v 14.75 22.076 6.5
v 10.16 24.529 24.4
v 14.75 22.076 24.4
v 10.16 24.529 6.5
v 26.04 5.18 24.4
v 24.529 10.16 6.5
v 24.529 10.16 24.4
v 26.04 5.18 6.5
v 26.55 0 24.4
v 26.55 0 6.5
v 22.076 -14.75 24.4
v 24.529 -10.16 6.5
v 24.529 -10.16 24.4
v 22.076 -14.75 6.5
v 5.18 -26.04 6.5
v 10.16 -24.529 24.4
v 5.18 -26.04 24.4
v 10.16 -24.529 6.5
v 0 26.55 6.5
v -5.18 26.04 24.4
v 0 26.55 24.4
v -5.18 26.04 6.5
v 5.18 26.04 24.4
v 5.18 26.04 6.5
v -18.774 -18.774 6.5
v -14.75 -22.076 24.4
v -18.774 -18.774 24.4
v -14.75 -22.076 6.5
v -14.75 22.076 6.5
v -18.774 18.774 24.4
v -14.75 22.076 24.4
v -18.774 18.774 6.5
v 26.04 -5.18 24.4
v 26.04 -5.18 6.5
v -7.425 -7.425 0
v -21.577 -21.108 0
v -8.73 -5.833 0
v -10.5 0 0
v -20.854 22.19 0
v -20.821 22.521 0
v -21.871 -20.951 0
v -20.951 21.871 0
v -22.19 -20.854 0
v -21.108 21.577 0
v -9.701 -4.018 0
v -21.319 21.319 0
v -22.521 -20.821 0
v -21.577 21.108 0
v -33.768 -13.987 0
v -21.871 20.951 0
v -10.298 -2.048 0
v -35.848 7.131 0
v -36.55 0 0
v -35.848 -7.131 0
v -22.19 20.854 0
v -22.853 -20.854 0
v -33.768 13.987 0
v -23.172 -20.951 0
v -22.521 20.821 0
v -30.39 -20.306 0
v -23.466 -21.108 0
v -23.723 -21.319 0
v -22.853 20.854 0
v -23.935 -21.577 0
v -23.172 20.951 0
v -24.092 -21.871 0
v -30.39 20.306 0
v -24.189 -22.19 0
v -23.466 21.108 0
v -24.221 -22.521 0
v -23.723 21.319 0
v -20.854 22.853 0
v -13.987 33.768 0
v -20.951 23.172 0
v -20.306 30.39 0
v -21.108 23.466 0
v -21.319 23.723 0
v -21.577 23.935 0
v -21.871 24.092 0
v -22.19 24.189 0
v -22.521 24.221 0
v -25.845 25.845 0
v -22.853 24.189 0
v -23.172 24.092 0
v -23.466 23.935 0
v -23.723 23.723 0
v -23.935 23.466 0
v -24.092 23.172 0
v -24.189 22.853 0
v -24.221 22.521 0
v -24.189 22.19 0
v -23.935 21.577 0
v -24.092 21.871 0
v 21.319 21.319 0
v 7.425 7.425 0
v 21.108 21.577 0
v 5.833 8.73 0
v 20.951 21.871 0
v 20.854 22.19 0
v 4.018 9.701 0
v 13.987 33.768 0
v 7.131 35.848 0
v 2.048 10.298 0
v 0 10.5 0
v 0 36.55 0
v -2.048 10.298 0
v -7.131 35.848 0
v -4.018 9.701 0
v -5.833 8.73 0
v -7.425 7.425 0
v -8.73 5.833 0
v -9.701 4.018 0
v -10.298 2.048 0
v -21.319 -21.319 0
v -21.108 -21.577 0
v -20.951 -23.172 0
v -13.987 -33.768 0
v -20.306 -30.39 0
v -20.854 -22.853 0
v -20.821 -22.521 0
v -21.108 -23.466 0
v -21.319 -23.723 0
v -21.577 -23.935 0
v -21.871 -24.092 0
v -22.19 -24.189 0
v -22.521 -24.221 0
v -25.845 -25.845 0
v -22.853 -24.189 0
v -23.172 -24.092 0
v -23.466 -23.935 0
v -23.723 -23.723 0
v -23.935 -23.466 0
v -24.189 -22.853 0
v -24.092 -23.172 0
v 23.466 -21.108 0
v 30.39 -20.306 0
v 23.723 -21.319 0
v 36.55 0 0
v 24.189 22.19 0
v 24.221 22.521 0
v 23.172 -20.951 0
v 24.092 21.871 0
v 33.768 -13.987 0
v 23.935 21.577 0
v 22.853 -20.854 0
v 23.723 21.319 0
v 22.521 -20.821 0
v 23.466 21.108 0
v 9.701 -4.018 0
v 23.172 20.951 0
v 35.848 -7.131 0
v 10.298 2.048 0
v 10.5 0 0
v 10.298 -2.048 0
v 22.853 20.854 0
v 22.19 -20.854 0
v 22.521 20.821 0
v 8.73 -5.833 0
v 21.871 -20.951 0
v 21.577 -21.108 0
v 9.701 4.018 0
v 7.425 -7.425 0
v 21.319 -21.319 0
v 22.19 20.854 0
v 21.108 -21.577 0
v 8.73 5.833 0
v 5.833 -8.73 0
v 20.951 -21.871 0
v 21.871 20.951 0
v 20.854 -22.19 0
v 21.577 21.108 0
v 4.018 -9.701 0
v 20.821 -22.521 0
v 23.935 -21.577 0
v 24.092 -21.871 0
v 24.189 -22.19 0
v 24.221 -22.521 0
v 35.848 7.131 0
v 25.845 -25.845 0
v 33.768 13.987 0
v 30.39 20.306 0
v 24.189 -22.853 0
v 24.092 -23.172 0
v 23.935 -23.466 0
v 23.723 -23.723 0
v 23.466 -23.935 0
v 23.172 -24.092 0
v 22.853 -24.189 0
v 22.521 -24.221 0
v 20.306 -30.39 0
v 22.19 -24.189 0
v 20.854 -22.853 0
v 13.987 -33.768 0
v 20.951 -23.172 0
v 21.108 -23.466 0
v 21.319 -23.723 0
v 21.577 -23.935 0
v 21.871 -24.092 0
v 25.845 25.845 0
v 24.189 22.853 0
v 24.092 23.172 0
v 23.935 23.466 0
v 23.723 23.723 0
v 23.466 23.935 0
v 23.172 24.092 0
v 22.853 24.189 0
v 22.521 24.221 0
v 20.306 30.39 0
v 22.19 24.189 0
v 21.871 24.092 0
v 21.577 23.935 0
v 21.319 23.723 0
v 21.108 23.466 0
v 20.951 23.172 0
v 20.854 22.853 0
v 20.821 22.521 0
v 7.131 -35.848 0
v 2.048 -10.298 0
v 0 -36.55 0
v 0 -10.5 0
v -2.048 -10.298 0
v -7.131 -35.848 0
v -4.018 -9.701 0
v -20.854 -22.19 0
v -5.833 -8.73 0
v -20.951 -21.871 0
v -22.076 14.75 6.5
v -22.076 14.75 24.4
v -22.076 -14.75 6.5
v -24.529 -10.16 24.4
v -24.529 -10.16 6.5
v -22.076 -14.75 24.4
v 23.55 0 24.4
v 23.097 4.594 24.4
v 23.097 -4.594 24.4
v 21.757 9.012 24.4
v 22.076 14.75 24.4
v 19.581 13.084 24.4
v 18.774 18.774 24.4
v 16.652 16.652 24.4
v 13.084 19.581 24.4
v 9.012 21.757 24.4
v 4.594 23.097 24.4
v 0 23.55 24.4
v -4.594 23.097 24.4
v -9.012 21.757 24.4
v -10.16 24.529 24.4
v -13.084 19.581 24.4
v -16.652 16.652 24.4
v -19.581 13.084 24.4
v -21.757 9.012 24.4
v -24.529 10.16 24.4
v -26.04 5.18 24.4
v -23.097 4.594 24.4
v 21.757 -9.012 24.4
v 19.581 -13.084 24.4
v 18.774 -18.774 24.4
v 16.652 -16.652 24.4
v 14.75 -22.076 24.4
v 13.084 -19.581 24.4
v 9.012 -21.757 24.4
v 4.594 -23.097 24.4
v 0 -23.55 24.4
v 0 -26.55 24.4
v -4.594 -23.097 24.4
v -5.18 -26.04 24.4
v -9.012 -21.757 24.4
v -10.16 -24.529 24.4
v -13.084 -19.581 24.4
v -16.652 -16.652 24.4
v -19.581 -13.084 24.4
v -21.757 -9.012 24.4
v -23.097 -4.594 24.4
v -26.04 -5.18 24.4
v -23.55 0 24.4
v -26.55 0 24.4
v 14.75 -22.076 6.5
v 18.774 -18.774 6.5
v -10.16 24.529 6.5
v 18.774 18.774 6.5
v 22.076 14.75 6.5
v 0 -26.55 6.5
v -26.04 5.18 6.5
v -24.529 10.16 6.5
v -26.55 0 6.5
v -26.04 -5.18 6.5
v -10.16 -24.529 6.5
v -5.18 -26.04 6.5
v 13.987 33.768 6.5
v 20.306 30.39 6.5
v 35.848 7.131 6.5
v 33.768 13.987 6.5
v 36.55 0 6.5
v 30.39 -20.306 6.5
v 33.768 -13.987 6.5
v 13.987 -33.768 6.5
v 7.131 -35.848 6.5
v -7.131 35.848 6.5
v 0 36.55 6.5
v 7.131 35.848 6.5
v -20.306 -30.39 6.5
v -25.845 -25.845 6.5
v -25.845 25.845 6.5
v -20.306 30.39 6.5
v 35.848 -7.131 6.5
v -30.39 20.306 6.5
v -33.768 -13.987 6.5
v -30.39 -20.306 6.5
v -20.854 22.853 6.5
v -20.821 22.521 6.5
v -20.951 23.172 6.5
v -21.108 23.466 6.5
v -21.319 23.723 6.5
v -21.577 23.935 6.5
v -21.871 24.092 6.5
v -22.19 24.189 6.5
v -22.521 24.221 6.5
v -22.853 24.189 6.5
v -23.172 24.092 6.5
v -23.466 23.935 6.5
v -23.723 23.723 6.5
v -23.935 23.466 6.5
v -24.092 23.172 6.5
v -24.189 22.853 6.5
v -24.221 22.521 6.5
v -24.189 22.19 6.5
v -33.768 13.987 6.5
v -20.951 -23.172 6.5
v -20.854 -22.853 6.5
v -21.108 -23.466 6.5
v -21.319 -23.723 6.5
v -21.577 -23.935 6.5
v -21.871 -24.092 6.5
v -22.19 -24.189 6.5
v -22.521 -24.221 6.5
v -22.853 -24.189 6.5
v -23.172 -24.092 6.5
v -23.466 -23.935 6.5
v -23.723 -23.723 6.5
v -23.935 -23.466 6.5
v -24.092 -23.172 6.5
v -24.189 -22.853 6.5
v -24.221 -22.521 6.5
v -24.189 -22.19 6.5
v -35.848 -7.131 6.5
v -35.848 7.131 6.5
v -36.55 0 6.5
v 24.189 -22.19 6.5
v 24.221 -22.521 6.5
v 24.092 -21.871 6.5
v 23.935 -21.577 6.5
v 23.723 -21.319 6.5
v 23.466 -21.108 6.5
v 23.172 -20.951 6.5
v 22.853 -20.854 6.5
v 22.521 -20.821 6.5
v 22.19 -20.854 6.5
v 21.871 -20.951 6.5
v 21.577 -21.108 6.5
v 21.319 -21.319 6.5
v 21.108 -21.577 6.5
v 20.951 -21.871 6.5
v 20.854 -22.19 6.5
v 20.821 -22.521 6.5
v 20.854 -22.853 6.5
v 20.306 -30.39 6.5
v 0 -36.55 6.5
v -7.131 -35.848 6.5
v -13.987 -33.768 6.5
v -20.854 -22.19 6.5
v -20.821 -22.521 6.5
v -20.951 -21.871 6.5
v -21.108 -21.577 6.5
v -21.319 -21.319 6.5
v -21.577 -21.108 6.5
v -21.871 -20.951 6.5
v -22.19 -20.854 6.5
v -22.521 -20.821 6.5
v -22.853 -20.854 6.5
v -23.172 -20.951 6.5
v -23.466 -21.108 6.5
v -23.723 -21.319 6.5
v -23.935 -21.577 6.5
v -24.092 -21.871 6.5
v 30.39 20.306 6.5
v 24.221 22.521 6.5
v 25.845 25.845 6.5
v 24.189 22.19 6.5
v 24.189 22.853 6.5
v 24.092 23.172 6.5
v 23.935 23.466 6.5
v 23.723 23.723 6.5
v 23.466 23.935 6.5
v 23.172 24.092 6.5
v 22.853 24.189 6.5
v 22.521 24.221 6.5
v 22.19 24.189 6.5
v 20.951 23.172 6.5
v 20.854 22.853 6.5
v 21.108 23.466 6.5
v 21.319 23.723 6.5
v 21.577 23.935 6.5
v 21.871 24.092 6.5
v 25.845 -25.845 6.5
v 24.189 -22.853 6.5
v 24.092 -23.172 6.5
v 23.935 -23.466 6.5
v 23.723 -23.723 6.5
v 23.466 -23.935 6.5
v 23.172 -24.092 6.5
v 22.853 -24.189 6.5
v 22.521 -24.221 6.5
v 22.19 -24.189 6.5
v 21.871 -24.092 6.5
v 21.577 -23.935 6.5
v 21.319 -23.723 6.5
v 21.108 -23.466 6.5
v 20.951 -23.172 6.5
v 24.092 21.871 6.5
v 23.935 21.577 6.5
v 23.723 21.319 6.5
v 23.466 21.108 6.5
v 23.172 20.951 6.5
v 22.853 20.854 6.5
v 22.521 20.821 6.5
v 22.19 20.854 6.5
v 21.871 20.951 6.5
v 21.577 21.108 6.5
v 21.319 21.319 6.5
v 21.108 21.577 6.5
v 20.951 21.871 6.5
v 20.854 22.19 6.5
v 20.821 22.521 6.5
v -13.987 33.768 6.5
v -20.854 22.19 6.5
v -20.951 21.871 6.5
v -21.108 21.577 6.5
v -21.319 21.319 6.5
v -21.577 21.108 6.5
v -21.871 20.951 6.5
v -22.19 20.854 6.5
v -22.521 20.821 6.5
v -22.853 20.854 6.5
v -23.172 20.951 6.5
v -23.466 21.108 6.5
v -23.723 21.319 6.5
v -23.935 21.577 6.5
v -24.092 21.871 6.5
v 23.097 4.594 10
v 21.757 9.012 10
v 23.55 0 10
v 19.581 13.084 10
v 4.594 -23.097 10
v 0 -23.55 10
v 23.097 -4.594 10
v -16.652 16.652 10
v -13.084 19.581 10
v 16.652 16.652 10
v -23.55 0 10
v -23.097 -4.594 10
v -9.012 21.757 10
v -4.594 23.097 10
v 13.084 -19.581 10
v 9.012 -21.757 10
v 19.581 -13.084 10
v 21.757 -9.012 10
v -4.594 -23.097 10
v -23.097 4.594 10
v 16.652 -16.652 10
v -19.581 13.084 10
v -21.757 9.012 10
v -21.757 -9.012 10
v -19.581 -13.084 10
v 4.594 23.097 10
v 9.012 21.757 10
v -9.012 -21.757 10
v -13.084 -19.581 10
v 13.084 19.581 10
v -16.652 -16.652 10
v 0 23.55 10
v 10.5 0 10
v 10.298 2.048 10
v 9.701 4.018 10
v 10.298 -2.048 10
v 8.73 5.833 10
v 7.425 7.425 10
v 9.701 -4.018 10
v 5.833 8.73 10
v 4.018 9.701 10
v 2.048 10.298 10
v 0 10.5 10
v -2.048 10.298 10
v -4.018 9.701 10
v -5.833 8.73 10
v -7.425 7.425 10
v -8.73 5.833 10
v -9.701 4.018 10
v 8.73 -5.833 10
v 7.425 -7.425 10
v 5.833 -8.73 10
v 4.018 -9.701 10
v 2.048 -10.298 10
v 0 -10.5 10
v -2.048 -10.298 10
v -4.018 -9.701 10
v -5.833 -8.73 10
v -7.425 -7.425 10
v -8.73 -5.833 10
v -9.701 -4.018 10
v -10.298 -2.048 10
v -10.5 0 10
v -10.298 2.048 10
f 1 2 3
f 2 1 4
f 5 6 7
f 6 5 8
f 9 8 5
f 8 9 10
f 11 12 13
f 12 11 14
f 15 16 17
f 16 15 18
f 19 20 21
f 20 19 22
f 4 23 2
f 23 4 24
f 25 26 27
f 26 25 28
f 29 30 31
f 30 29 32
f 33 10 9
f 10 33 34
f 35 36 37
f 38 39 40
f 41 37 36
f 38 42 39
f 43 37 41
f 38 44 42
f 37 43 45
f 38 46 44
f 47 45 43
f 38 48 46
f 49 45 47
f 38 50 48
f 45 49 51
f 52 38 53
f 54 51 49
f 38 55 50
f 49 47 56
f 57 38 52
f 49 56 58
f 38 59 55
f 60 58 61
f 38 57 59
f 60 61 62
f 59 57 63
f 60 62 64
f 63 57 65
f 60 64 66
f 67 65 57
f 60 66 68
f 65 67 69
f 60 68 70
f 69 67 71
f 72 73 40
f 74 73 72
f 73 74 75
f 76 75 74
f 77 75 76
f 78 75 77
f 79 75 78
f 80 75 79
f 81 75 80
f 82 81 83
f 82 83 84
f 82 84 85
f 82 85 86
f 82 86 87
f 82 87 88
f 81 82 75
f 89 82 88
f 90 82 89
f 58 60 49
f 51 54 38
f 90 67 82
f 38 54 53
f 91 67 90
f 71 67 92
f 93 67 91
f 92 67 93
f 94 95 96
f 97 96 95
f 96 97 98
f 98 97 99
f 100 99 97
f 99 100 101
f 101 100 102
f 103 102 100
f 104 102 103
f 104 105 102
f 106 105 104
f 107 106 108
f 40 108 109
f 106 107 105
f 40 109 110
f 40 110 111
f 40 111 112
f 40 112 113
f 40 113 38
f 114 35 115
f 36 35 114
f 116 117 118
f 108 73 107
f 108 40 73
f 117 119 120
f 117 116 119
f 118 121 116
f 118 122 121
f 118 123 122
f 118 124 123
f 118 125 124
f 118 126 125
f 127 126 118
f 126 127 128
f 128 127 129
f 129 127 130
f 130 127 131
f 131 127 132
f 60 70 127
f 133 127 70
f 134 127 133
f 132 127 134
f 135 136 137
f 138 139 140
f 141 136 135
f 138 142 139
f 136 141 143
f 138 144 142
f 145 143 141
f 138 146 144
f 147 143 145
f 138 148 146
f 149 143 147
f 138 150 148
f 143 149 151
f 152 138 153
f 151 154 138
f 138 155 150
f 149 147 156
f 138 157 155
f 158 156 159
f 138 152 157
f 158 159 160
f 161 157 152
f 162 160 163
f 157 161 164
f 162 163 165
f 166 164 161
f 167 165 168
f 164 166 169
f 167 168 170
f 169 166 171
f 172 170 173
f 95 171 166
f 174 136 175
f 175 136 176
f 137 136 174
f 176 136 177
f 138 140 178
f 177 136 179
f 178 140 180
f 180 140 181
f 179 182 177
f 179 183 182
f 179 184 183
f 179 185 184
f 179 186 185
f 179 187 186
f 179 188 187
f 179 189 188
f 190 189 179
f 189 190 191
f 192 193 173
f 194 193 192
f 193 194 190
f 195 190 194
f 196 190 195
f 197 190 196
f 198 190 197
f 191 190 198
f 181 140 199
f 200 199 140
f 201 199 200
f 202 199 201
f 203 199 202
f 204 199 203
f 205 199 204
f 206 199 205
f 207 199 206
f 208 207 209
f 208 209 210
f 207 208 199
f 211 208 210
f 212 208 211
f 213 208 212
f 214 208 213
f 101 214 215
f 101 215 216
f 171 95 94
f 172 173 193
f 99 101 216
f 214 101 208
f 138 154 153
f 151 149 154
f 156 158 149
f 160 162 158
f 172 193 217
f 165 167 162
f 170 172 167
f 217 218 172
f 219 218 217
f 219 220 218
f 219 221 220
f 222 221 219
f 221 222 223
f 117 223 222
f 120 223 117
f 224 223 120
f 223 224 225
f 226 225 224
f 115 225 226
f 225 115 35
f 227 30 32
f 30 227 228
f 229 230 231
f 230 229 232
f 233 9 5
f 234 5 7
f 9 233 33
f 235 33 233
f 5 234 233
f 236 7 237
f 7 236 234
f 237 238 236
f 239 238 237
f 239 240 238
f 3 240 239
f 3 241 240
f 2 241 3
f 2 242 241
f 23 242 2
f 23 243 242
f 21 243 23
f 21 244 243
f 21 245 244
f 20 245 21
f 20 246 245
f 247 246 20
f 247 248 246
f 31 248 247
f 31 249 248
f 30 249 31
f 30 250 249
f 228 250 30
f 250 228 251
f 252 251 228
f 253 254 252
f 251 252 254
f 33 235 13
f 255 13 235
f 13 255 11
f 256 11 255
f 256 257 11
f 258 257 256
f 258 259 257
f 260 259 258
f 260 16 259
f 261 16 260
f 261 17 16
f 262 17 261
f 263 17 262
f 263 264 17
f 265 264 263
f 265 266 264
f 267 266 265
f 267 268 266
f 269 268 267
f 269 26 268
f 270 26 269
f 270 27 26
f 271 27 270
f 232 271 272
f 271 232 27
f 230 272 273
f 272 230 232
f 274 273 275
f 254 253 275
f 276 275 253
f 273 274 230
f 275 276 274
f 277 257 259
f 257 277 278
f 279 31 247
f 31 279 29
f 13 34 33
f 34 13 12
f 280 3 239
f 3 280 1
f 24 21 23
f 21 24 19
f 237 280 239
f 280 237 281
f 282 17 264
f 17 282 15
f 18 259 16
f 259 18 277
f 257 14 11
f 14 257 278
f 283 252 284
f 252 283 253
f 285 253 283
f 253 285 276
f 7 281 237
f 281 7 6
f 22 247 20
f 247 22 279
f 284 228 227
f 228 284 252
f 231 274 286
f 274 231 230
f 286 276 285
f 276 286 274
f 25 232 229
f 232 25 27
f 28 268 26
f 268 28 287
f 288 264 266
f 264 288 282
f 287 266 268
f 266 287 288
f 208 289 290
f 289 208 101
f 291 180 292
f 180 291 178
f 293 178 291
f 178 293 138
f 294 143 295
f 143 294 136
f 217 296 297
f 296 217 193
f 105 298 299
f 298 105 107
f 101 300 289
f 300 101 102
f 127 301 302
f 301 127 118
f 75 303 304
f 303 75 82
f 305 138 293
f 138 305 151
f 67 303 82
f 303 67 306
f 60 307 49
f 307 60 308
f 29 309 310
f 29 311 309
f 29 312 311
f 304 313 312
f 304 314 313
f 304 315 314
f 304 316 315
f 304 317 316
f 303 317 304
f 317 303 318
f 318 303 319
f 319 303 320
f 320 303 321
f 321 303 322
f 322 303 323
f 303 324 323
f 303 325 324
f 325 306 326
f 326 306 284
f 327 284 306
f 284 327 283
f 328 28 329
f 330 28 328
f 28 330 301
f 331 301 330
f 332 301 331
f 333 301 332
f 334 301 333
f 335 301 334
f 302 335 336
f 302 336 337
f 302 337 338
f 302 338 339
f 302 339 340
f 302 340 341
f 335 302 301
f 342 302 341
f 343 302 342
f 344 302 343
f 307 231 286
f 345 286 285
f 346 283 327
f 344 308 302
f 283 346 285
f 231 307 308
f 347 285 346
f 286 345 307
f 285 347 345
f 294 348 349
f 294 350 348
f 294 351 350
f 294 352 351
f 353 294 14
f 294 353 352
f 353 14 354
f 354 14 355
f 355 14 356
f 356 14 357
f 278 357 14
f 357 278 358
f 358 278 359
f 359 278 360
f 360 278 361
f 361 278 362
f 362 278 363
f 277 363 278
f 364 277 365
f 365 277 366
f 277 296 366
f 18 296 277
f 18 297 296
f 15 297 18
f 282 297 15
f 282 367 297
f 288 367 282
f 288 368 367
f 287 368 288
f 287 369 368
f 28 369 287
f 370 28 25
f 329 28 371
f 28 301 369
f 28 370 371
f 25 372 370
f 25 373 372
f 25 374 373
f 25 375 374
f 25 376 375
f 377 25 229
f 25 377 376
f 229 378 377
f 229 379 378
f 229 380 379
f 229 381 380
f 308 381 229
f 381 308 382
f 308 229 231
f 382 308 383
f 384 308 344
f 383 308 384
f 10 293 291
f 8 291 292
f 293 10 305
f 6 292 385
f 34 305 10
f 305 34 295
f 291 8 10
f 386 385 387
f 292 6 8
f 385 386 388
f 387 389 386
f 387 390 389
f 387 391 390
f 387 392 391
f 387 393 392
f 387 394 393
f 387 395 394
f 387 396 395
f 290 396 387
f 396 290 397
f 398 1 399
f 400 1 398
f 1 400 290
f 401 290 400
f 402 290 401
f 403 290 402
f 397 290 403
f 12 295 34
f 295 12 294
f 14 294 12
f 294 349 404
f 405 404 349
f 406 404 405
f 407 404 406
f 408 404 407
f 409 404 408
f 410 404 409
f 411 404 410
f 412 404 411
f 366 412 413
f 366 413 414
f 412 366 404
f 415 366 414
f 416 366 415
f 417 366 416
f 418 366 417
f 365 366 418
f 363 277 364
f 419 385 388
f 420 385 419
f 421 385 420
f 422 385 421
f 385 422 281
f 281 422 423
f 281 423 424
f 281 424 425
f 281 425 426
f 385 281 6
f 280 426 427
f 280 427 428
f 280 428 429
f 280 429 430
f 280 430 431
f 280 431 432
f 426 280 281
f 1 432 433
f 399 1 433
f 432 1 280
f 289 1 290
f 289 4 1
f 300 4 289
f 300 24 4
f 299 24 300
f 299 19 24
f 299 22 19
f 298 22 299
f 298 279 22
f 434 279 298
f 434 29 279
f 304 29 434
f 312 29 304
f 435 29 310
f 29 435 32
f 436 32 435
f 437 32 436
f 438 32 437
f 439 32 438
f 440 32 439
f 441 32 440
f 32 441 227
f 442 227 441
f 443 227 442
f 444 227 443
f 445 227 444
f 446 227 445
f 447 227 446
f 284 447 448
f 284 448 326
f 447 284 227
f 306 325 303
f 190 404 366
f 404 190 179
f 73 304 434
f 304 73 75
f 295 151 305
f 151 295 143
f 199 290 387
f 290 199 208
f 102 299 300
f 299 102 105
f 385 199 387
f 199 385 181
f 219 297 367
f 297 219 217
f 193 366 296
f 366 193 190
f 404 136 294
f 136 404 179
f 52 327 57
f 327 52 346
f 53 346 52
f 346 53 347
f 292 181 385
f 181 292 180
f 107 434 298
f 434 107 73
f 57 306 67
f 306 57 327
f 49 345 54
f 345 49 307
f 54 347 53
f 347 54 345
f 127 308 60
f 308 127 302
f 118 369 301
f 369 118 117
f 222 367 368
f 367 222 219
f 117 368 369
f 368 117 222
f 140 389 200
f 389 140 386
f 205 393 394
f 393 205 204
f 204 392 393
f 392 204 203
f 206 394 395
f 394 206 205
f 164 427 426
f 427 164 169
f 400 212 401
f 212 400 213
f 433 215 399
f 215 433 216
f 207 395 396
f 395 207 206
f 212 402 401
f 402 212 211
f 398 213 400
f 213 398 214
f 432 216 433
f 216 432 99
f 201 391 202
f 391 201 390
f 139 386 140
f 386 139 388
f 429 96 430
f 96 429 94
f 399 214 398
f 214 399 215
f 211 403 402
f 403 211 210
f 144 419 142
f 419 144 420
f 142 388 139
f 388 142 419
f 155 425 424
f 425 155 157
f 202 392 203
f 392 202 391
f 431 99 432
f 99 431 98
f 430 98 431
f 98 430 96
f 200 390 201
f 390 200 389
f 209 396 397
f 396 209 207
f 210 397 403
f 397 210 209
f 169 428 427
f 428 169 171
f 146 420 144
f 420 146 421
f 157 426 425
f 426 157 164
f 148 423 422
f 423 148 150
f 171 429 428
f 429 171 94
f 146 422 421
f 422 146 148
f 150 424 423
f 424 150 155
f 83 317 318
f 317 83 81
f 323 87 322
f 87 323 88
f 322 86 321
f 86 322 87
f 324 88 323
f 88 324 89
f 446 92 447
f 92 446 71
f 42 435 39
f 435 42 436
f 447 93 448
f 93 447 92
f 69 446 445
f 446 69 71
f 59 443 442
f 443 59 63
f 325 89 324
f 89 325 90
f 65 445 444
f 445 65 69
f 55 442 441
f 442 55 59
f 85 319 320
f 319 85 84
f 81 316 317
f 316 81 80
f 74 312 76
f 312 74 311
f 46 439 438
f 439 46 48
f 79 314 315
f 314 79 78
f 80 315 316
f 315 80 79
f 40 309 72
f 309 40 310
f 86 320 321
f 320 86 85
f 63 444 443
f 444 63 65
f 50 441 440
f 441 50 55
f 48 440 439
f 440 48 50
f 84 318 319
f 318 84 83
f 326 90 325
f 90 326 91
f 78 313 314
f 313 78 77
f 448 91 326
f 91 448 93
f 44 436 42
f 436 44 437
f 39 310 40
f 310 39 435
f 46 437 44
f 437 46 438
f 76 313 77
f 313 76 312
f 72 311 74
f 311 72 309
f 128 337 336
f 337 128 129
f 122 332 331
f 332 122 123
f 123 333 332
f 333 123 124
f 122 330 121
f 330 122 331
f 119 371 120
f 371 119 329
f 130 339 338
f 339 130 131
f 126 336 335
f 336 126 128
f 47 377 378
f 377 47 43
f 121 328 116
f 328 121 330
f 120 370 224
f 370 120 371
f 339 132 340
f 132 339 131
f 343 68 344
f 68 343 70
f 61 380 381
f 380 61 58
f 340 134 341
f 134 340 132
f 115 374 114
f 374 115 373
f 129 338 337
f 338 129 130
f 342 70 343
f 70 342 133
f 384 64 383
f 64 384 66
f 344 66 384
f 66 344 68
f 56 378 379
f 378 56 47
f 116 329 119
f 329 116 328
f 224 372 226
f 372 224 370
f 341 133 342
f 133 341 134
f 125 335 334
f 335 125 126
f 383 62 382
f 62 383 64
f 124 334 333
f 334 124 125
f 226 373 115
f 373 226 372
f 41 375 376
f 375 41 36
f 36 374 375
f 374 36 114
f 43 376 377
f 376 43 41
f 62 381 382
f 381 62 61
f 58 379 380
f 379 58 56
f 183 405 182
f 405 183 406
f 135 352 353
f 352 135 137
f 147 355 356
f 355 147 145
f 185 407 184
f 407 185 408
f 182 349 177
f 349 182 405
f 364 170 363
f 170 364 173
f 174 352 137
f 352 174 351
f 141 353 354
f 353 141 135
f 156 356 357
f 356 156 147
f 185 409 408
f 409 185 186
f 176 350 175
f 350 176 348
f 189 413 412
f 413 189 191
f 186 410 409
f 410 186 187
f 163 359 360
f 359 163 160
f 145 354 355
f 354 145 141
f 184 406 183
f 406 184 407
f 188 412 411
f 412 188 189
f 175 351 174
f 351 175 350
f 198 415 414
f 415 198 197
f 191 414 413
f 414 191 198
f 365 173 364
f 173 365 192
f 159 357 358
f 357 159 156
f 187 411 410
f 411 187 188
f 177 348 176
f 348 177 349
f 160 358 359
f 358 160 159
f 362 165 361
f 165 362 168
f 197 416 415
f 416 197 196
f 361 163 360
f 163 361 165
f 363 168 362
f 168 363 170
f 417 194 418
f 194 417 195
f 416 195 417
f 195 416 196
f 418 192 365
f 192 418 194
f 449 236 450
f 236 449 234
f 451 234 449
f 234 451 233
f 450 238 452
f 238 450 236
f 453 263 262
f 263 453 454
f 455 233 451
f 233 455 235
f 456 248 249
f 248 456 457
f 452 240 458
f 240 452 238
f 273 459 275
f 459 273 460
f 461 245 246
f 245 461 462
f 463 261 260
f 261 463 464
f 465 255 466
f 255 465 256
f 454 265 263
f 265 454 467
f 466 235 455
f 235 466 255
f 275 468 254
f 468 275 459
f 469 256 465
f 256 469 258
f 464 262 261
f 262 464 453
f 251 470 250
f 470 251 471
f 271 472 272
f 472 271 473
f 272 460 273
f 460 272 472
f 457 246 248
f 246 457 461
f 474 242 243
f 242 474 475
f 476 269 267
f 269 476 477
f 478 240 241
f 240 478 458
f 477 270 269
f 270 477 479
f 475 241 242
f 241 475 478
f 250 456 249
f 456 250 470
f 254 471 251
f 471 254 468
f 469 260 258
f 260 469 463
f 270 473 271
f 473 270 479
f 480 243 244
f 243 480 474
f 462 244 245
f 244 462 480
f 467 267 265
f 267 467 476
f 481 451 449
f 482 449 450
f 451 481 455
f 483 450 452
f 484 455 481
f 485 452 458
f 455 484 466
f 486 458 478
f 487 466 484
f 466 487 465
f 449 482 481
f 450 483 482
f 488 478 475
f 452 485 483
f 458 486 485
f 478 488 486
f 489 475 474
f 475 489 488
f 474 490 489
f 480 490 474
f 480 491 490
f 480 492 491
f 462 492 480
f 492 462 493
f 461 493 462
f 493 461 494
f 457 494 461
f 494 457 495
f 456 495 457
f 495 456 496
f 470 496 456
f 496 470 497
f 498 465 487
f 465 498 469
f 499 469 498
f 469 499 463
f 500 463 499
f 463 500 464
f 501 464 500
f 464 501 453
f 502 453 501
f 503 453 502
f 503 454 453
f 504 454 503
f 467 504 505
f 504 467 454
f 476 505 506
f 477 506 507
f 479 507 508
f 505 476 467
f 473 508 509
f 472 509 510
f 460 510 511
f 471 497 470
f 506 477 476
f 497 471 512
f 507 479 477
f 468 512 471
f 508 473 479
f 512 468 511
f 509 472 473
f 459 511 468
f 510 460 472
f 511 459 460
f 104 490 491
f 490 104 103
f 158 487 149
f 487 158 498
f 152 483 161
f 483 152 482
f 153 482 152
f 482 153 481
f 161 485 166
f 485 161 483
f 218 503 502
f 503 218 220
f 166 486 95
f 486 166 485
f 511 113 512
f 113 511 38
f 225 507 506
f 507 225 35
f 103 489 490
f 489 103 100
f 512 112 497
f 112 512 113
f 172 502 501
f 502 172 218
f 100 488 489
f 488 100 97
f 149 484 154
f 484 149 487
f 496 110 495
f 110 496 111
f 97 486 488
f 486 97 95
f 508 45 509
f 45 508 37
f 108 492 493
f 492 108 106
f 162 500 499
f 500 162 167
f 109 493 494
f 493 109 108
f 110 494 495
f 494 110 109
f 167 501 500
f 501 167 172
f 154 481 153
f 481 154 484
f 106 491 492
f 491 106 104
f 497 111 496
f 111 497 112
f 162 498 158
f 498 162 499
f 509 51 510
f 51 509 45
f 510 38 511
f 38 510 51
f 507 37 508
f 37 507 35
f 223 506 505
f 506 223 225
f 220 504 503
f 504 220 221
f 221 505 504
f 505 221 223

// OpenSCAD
$fn = 32;

// ----------------------------------------------------------------------
// Bearing housing: seat for 6204 (47 x 14 mm), 53.1 mm body
// ----------------------------------------------------------------------

// --- parameters (mm) ---
case_d = 53.1;            // housing outside diameter
case_h = 24.4;            // overall housing height
rim_t = 3;                // wall thickness
bearing_seat = 47.1;      // 6204 seat, 0.1 mm clearance
seat_h = 14.4;            // pocket depth
shoulder = 5;             // shoulder under the bearing
pass_d = 21;              // shaft passage
ear_d = 73.1;             // mounting flange diameter
flange_t = 5;             // flange thickness
bolt_d = 3.4;             // flange bolt clearance
bolt_r = 31.85;           // flange bolt circle radius

module body() {
  cylinder(h = case_h, d = case_d);
}

module flange() {
  /* flange sunk 1.5 mm into the body */
  cylinder(h = flange_t + 1.5, d = ear_d);
}

difference() {
  union() {
    body();
    flange();
  }
  translate([0, 0, case_h - seat_h]) cylinder(h = seat_h + 1, d = bearing_seat);
  translate([0, 0, -1]) cylinder(h = case_h - seat_h + 1, d = pass_d);
  for (i = [0 : 3]) rotate([0, 0, 45 + i * 90]) translate([bolt_r, 0, -1])
    cylinder(h = flange_t + 3, d = bolt_d);
}
